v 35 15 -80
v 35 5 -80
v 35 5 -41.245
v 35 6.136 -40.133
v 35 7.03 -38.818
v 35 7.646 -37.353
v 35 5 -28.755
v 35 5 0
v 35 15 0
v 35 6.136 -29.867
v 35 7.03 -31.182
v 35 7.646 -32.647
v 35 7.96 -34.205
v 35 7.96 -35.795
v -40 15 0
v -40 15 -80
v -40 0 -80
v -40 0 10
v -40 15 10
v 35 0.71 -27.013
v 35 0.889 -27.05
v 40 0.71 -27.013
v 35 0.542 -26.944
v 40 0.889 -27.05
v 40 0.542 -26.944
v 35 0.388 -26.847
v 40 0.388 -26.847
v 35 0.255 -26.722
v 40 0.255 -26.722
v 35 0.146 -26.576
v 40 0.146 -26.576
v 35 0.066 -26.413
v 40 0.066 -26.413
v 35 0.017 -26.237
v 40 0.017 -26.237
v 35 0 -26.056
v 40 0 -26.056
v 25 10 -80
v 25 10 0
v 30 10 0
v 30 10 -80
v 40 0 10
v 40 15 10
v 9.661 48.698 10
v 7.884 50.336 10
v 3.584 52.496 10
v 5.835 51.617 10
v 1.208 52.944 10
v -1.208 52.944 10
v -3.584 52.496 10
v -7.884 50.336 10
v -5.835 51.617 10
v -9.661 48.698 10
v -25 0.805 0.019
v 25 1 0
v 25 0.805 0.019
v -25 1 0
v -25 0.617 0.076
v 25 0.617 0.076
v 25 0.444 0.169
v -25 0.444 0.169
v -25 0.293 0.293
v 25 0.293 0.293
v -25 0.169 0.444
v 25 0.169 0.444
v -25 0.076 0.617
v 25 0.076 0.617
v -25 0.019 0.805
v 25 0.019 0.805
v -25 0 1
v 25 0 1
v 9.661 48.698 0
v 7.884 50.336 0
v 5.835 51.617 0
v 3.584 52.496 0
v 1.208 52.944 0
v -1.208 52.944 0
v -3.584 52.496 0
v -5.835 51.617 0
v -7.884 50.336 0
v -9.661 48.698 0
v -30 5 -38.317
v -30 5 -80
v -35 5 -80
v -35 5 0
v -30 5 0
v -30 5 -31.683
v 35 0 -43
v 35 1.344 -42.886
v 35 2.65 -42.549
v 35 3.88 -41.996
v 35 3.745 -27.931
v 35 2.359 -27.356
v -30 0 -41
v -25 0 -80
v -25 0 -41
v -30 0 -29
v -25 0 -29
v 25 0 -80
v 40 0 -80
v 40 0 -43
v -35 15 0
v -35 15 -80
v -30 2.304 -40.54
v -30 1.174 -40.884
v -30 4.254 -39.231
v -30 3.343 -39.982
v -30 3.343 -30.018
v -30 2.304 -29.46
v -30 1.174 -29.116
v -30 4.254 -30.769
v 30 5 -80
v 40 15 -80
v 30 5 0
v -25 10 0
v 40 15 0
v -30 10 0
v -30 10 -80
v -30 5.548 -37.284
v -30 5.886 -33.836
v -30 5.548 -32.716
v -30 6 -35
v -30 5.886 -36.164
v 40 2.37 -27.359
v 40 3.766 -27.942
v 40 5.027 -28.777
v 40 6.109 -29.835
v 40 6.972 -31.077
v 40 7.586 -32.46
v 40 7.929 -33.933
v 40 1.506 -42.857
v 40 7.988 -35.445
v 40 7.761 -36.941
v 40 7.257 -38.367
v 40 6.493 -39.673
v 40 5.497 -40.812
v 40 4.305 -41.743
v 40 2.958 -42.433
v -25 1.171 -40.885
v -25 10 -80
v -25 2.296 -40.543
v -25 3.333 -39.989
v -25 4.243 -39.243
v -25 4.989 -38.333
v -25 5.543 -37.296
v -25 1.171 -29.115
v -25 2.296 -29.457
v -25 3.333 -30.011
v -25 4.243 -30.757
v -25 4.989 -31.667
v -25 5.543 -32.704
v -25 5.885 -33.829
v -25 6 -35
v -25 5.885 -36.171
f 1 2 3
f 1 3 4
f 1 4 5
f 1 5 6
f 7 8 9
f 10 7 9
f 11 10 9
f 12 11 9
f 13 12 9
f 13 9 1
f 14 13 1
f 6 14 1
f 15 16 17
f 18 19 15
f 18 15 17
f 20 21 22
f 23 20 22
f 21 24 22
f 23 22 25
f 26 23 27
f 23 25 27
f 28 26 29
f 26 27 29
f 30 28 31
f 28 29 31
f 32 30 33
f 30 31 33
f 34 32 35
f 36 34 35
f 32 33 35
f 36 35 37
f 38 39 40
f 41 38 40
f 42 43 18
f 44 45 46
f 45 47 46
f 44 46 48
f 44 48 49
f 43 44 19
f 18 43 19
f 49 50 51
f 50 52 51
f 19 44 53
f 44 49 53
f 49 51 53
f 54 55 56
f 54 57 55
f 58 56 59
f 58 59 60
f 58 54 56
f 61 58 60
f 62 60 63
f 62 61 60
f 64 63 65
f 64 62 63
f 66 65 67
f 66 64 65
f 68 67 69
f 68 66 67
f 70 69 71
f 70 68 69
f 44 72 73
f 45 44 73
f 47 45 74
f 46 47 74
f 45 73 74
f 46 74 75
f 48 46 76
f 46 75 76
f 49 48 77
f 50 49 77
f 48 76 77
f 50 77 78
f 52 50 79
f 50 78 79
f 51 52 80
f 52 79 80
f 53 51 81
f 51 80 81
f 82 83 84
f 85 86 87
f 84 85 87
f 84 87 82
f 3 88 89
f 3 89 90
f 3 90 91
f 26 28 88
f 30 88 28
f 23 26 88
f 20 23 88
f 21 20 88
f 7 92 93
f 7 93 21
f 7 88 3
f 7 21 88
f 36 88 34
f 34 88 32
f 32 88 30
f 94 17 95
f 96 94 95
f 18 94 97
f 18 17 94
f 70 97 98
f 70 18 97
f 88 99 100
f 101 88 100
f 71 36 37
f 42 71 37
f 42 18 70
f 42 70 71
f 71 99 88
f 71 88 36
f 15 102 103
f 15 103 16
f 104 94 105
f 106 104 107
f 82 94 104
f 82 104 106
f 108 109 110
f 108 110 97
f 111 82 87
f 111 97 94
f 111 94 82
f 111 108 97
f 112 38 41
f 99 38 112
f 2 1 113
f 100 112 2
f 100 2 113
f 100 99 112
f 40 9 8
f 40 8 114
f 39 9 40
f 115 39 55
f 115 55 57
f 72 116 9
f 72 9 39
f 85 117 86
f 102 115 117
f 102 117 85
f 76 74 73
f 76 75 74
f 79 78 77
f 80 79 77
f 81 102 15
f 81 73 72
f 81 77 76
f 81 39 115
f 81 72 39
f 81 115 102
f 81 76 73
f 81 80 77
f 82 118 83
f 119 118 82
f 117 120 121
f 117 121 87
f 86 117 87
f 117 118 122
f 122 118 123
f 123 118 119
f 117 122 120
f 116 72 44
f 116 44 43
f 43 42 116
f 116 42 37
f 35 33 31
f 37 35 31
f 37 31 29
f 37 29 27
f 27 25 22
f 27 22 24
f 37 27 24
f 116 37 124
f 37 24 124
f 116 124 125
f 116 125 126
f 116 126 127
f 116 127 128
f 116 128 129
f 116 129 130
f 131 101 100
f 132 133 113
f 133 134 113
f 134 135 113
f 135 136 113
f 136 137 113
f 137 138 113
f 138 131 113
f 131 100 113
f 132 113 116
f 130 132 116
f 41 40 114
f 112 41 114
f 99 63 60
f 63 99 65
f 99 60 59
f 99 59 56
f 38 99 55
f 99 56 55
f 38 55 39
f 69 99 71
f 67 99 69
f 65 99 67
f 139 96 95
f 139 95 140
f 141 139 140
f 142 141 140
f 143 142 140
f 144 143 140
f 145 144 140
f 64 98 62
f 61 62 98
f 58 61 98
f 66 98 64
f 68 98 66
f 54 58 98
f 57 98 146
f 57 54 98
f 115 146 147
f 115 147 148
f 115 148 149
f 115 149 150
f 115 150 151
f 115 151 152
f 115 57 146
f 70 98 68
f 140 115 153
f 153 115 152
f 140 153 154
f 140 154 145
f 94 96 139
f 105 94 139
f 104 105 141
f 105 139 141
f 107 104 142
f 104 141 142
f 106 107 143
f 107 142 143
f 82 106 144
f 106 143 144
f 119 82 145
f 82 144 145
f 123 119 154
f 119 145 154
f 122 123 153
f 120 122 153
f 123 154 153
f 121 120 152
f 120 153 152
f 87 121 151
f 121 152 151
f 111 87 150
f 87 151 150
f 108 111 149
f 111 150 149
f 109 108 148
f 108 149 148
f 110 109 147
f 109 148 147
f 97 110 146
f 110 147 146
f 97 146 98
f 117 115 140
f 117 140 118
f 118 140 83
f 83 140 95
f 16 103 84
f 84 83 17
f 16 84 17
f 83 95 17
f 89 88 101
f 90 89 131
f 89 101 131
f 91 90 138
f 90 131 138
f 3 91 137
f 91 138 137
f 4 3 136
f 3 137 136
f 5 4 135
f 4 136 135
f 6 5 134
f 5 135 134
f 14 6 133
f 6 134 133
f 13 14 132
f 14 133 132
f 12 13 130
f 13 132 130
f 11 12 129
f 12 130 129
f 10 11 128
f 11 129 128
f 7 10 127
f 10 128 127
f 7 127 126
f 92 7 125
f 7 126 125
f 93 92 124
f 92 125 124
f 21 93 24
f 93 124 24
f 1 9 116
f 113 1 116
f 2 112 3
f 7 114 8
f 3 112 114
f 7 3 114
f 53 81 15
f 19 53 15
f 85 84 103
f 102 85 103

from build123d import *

# Parameters (mm, degrees)
PAD_DEPTH       = 10
PAD001_DEPTH    = 80
SKETCH003_R     = 8
POCKET_DEPTH    = 5
SKETCH004_R     = 6
POCKET001_DEPTH = 5
FILLET_R        = 1


with BuildPart() as part:
    # Sketch → Pad (new body)
    with BuildSketch(Plane.XY):
        with BuildLine():
            Line((40, 0), (-40, 0))
            Line((-40, 0), (-40, 15))
            Line((-9.661357, 48.698171), (-40, 15))
            ThreePointArc((9.661357, 48.698171), (0, 53), (-9.661357, 48.698171))
            Line((9.661357, 48.698171), (40, 15))
            Line((40, 0), (40, 15))
        make_face()
    extrude(amount=PAD_DEPTH)

    # Sketch002 (on Face7 of Pad) → Pad001 (join)
    with BuildSketch(Plane(origin=(0, 0, 0), x_dir=(1, 0, 0), z_dir=(0, 0, -1))):
        Polygon((-40, -15), (-40, 0), (-25, 0), (-25, -10), (-30, -10), (-30, -5), (-35, -5), (-35, -15), align=None)
        Polygon((40, -15), (40, 0), (25, 0), (25, -10), (30, -10), (30, -5), (35, -5), (35, -15), align=None)
    extrude(amount=PAD001_DEPTH)

    # Sketch003 (on Face9 of Pad001) → Pocket (cut)
    with BuildSketch(Plane.YZ.offset(40)):
        with Locations((0, -35)):
            Circle(SKETCH003_R)
    extrude(amount=-POCKET_DEPTH, mode=Mode.SUBTRACT)

    # Sketch004 (on Face28 of Pocket) → Pocket001 (cut)
    with BuildSketch(Plane.YZ.offset(-25)):
        with Locations((0, -35)):
            Circle(SKETCH004_R)
    extrude(amount=-POCKET001_DEPTH, mode=Mode.SUBTRACT)

    # Fillet
    fillet_edges = [part.edges().sort_by_distance(p)[0] for p in [
        (37.5, 0, -27),
        (0, 0, 0),
    ]]
    fillet(fillet_edges, radius=FILLET_R)


solid = part.part
